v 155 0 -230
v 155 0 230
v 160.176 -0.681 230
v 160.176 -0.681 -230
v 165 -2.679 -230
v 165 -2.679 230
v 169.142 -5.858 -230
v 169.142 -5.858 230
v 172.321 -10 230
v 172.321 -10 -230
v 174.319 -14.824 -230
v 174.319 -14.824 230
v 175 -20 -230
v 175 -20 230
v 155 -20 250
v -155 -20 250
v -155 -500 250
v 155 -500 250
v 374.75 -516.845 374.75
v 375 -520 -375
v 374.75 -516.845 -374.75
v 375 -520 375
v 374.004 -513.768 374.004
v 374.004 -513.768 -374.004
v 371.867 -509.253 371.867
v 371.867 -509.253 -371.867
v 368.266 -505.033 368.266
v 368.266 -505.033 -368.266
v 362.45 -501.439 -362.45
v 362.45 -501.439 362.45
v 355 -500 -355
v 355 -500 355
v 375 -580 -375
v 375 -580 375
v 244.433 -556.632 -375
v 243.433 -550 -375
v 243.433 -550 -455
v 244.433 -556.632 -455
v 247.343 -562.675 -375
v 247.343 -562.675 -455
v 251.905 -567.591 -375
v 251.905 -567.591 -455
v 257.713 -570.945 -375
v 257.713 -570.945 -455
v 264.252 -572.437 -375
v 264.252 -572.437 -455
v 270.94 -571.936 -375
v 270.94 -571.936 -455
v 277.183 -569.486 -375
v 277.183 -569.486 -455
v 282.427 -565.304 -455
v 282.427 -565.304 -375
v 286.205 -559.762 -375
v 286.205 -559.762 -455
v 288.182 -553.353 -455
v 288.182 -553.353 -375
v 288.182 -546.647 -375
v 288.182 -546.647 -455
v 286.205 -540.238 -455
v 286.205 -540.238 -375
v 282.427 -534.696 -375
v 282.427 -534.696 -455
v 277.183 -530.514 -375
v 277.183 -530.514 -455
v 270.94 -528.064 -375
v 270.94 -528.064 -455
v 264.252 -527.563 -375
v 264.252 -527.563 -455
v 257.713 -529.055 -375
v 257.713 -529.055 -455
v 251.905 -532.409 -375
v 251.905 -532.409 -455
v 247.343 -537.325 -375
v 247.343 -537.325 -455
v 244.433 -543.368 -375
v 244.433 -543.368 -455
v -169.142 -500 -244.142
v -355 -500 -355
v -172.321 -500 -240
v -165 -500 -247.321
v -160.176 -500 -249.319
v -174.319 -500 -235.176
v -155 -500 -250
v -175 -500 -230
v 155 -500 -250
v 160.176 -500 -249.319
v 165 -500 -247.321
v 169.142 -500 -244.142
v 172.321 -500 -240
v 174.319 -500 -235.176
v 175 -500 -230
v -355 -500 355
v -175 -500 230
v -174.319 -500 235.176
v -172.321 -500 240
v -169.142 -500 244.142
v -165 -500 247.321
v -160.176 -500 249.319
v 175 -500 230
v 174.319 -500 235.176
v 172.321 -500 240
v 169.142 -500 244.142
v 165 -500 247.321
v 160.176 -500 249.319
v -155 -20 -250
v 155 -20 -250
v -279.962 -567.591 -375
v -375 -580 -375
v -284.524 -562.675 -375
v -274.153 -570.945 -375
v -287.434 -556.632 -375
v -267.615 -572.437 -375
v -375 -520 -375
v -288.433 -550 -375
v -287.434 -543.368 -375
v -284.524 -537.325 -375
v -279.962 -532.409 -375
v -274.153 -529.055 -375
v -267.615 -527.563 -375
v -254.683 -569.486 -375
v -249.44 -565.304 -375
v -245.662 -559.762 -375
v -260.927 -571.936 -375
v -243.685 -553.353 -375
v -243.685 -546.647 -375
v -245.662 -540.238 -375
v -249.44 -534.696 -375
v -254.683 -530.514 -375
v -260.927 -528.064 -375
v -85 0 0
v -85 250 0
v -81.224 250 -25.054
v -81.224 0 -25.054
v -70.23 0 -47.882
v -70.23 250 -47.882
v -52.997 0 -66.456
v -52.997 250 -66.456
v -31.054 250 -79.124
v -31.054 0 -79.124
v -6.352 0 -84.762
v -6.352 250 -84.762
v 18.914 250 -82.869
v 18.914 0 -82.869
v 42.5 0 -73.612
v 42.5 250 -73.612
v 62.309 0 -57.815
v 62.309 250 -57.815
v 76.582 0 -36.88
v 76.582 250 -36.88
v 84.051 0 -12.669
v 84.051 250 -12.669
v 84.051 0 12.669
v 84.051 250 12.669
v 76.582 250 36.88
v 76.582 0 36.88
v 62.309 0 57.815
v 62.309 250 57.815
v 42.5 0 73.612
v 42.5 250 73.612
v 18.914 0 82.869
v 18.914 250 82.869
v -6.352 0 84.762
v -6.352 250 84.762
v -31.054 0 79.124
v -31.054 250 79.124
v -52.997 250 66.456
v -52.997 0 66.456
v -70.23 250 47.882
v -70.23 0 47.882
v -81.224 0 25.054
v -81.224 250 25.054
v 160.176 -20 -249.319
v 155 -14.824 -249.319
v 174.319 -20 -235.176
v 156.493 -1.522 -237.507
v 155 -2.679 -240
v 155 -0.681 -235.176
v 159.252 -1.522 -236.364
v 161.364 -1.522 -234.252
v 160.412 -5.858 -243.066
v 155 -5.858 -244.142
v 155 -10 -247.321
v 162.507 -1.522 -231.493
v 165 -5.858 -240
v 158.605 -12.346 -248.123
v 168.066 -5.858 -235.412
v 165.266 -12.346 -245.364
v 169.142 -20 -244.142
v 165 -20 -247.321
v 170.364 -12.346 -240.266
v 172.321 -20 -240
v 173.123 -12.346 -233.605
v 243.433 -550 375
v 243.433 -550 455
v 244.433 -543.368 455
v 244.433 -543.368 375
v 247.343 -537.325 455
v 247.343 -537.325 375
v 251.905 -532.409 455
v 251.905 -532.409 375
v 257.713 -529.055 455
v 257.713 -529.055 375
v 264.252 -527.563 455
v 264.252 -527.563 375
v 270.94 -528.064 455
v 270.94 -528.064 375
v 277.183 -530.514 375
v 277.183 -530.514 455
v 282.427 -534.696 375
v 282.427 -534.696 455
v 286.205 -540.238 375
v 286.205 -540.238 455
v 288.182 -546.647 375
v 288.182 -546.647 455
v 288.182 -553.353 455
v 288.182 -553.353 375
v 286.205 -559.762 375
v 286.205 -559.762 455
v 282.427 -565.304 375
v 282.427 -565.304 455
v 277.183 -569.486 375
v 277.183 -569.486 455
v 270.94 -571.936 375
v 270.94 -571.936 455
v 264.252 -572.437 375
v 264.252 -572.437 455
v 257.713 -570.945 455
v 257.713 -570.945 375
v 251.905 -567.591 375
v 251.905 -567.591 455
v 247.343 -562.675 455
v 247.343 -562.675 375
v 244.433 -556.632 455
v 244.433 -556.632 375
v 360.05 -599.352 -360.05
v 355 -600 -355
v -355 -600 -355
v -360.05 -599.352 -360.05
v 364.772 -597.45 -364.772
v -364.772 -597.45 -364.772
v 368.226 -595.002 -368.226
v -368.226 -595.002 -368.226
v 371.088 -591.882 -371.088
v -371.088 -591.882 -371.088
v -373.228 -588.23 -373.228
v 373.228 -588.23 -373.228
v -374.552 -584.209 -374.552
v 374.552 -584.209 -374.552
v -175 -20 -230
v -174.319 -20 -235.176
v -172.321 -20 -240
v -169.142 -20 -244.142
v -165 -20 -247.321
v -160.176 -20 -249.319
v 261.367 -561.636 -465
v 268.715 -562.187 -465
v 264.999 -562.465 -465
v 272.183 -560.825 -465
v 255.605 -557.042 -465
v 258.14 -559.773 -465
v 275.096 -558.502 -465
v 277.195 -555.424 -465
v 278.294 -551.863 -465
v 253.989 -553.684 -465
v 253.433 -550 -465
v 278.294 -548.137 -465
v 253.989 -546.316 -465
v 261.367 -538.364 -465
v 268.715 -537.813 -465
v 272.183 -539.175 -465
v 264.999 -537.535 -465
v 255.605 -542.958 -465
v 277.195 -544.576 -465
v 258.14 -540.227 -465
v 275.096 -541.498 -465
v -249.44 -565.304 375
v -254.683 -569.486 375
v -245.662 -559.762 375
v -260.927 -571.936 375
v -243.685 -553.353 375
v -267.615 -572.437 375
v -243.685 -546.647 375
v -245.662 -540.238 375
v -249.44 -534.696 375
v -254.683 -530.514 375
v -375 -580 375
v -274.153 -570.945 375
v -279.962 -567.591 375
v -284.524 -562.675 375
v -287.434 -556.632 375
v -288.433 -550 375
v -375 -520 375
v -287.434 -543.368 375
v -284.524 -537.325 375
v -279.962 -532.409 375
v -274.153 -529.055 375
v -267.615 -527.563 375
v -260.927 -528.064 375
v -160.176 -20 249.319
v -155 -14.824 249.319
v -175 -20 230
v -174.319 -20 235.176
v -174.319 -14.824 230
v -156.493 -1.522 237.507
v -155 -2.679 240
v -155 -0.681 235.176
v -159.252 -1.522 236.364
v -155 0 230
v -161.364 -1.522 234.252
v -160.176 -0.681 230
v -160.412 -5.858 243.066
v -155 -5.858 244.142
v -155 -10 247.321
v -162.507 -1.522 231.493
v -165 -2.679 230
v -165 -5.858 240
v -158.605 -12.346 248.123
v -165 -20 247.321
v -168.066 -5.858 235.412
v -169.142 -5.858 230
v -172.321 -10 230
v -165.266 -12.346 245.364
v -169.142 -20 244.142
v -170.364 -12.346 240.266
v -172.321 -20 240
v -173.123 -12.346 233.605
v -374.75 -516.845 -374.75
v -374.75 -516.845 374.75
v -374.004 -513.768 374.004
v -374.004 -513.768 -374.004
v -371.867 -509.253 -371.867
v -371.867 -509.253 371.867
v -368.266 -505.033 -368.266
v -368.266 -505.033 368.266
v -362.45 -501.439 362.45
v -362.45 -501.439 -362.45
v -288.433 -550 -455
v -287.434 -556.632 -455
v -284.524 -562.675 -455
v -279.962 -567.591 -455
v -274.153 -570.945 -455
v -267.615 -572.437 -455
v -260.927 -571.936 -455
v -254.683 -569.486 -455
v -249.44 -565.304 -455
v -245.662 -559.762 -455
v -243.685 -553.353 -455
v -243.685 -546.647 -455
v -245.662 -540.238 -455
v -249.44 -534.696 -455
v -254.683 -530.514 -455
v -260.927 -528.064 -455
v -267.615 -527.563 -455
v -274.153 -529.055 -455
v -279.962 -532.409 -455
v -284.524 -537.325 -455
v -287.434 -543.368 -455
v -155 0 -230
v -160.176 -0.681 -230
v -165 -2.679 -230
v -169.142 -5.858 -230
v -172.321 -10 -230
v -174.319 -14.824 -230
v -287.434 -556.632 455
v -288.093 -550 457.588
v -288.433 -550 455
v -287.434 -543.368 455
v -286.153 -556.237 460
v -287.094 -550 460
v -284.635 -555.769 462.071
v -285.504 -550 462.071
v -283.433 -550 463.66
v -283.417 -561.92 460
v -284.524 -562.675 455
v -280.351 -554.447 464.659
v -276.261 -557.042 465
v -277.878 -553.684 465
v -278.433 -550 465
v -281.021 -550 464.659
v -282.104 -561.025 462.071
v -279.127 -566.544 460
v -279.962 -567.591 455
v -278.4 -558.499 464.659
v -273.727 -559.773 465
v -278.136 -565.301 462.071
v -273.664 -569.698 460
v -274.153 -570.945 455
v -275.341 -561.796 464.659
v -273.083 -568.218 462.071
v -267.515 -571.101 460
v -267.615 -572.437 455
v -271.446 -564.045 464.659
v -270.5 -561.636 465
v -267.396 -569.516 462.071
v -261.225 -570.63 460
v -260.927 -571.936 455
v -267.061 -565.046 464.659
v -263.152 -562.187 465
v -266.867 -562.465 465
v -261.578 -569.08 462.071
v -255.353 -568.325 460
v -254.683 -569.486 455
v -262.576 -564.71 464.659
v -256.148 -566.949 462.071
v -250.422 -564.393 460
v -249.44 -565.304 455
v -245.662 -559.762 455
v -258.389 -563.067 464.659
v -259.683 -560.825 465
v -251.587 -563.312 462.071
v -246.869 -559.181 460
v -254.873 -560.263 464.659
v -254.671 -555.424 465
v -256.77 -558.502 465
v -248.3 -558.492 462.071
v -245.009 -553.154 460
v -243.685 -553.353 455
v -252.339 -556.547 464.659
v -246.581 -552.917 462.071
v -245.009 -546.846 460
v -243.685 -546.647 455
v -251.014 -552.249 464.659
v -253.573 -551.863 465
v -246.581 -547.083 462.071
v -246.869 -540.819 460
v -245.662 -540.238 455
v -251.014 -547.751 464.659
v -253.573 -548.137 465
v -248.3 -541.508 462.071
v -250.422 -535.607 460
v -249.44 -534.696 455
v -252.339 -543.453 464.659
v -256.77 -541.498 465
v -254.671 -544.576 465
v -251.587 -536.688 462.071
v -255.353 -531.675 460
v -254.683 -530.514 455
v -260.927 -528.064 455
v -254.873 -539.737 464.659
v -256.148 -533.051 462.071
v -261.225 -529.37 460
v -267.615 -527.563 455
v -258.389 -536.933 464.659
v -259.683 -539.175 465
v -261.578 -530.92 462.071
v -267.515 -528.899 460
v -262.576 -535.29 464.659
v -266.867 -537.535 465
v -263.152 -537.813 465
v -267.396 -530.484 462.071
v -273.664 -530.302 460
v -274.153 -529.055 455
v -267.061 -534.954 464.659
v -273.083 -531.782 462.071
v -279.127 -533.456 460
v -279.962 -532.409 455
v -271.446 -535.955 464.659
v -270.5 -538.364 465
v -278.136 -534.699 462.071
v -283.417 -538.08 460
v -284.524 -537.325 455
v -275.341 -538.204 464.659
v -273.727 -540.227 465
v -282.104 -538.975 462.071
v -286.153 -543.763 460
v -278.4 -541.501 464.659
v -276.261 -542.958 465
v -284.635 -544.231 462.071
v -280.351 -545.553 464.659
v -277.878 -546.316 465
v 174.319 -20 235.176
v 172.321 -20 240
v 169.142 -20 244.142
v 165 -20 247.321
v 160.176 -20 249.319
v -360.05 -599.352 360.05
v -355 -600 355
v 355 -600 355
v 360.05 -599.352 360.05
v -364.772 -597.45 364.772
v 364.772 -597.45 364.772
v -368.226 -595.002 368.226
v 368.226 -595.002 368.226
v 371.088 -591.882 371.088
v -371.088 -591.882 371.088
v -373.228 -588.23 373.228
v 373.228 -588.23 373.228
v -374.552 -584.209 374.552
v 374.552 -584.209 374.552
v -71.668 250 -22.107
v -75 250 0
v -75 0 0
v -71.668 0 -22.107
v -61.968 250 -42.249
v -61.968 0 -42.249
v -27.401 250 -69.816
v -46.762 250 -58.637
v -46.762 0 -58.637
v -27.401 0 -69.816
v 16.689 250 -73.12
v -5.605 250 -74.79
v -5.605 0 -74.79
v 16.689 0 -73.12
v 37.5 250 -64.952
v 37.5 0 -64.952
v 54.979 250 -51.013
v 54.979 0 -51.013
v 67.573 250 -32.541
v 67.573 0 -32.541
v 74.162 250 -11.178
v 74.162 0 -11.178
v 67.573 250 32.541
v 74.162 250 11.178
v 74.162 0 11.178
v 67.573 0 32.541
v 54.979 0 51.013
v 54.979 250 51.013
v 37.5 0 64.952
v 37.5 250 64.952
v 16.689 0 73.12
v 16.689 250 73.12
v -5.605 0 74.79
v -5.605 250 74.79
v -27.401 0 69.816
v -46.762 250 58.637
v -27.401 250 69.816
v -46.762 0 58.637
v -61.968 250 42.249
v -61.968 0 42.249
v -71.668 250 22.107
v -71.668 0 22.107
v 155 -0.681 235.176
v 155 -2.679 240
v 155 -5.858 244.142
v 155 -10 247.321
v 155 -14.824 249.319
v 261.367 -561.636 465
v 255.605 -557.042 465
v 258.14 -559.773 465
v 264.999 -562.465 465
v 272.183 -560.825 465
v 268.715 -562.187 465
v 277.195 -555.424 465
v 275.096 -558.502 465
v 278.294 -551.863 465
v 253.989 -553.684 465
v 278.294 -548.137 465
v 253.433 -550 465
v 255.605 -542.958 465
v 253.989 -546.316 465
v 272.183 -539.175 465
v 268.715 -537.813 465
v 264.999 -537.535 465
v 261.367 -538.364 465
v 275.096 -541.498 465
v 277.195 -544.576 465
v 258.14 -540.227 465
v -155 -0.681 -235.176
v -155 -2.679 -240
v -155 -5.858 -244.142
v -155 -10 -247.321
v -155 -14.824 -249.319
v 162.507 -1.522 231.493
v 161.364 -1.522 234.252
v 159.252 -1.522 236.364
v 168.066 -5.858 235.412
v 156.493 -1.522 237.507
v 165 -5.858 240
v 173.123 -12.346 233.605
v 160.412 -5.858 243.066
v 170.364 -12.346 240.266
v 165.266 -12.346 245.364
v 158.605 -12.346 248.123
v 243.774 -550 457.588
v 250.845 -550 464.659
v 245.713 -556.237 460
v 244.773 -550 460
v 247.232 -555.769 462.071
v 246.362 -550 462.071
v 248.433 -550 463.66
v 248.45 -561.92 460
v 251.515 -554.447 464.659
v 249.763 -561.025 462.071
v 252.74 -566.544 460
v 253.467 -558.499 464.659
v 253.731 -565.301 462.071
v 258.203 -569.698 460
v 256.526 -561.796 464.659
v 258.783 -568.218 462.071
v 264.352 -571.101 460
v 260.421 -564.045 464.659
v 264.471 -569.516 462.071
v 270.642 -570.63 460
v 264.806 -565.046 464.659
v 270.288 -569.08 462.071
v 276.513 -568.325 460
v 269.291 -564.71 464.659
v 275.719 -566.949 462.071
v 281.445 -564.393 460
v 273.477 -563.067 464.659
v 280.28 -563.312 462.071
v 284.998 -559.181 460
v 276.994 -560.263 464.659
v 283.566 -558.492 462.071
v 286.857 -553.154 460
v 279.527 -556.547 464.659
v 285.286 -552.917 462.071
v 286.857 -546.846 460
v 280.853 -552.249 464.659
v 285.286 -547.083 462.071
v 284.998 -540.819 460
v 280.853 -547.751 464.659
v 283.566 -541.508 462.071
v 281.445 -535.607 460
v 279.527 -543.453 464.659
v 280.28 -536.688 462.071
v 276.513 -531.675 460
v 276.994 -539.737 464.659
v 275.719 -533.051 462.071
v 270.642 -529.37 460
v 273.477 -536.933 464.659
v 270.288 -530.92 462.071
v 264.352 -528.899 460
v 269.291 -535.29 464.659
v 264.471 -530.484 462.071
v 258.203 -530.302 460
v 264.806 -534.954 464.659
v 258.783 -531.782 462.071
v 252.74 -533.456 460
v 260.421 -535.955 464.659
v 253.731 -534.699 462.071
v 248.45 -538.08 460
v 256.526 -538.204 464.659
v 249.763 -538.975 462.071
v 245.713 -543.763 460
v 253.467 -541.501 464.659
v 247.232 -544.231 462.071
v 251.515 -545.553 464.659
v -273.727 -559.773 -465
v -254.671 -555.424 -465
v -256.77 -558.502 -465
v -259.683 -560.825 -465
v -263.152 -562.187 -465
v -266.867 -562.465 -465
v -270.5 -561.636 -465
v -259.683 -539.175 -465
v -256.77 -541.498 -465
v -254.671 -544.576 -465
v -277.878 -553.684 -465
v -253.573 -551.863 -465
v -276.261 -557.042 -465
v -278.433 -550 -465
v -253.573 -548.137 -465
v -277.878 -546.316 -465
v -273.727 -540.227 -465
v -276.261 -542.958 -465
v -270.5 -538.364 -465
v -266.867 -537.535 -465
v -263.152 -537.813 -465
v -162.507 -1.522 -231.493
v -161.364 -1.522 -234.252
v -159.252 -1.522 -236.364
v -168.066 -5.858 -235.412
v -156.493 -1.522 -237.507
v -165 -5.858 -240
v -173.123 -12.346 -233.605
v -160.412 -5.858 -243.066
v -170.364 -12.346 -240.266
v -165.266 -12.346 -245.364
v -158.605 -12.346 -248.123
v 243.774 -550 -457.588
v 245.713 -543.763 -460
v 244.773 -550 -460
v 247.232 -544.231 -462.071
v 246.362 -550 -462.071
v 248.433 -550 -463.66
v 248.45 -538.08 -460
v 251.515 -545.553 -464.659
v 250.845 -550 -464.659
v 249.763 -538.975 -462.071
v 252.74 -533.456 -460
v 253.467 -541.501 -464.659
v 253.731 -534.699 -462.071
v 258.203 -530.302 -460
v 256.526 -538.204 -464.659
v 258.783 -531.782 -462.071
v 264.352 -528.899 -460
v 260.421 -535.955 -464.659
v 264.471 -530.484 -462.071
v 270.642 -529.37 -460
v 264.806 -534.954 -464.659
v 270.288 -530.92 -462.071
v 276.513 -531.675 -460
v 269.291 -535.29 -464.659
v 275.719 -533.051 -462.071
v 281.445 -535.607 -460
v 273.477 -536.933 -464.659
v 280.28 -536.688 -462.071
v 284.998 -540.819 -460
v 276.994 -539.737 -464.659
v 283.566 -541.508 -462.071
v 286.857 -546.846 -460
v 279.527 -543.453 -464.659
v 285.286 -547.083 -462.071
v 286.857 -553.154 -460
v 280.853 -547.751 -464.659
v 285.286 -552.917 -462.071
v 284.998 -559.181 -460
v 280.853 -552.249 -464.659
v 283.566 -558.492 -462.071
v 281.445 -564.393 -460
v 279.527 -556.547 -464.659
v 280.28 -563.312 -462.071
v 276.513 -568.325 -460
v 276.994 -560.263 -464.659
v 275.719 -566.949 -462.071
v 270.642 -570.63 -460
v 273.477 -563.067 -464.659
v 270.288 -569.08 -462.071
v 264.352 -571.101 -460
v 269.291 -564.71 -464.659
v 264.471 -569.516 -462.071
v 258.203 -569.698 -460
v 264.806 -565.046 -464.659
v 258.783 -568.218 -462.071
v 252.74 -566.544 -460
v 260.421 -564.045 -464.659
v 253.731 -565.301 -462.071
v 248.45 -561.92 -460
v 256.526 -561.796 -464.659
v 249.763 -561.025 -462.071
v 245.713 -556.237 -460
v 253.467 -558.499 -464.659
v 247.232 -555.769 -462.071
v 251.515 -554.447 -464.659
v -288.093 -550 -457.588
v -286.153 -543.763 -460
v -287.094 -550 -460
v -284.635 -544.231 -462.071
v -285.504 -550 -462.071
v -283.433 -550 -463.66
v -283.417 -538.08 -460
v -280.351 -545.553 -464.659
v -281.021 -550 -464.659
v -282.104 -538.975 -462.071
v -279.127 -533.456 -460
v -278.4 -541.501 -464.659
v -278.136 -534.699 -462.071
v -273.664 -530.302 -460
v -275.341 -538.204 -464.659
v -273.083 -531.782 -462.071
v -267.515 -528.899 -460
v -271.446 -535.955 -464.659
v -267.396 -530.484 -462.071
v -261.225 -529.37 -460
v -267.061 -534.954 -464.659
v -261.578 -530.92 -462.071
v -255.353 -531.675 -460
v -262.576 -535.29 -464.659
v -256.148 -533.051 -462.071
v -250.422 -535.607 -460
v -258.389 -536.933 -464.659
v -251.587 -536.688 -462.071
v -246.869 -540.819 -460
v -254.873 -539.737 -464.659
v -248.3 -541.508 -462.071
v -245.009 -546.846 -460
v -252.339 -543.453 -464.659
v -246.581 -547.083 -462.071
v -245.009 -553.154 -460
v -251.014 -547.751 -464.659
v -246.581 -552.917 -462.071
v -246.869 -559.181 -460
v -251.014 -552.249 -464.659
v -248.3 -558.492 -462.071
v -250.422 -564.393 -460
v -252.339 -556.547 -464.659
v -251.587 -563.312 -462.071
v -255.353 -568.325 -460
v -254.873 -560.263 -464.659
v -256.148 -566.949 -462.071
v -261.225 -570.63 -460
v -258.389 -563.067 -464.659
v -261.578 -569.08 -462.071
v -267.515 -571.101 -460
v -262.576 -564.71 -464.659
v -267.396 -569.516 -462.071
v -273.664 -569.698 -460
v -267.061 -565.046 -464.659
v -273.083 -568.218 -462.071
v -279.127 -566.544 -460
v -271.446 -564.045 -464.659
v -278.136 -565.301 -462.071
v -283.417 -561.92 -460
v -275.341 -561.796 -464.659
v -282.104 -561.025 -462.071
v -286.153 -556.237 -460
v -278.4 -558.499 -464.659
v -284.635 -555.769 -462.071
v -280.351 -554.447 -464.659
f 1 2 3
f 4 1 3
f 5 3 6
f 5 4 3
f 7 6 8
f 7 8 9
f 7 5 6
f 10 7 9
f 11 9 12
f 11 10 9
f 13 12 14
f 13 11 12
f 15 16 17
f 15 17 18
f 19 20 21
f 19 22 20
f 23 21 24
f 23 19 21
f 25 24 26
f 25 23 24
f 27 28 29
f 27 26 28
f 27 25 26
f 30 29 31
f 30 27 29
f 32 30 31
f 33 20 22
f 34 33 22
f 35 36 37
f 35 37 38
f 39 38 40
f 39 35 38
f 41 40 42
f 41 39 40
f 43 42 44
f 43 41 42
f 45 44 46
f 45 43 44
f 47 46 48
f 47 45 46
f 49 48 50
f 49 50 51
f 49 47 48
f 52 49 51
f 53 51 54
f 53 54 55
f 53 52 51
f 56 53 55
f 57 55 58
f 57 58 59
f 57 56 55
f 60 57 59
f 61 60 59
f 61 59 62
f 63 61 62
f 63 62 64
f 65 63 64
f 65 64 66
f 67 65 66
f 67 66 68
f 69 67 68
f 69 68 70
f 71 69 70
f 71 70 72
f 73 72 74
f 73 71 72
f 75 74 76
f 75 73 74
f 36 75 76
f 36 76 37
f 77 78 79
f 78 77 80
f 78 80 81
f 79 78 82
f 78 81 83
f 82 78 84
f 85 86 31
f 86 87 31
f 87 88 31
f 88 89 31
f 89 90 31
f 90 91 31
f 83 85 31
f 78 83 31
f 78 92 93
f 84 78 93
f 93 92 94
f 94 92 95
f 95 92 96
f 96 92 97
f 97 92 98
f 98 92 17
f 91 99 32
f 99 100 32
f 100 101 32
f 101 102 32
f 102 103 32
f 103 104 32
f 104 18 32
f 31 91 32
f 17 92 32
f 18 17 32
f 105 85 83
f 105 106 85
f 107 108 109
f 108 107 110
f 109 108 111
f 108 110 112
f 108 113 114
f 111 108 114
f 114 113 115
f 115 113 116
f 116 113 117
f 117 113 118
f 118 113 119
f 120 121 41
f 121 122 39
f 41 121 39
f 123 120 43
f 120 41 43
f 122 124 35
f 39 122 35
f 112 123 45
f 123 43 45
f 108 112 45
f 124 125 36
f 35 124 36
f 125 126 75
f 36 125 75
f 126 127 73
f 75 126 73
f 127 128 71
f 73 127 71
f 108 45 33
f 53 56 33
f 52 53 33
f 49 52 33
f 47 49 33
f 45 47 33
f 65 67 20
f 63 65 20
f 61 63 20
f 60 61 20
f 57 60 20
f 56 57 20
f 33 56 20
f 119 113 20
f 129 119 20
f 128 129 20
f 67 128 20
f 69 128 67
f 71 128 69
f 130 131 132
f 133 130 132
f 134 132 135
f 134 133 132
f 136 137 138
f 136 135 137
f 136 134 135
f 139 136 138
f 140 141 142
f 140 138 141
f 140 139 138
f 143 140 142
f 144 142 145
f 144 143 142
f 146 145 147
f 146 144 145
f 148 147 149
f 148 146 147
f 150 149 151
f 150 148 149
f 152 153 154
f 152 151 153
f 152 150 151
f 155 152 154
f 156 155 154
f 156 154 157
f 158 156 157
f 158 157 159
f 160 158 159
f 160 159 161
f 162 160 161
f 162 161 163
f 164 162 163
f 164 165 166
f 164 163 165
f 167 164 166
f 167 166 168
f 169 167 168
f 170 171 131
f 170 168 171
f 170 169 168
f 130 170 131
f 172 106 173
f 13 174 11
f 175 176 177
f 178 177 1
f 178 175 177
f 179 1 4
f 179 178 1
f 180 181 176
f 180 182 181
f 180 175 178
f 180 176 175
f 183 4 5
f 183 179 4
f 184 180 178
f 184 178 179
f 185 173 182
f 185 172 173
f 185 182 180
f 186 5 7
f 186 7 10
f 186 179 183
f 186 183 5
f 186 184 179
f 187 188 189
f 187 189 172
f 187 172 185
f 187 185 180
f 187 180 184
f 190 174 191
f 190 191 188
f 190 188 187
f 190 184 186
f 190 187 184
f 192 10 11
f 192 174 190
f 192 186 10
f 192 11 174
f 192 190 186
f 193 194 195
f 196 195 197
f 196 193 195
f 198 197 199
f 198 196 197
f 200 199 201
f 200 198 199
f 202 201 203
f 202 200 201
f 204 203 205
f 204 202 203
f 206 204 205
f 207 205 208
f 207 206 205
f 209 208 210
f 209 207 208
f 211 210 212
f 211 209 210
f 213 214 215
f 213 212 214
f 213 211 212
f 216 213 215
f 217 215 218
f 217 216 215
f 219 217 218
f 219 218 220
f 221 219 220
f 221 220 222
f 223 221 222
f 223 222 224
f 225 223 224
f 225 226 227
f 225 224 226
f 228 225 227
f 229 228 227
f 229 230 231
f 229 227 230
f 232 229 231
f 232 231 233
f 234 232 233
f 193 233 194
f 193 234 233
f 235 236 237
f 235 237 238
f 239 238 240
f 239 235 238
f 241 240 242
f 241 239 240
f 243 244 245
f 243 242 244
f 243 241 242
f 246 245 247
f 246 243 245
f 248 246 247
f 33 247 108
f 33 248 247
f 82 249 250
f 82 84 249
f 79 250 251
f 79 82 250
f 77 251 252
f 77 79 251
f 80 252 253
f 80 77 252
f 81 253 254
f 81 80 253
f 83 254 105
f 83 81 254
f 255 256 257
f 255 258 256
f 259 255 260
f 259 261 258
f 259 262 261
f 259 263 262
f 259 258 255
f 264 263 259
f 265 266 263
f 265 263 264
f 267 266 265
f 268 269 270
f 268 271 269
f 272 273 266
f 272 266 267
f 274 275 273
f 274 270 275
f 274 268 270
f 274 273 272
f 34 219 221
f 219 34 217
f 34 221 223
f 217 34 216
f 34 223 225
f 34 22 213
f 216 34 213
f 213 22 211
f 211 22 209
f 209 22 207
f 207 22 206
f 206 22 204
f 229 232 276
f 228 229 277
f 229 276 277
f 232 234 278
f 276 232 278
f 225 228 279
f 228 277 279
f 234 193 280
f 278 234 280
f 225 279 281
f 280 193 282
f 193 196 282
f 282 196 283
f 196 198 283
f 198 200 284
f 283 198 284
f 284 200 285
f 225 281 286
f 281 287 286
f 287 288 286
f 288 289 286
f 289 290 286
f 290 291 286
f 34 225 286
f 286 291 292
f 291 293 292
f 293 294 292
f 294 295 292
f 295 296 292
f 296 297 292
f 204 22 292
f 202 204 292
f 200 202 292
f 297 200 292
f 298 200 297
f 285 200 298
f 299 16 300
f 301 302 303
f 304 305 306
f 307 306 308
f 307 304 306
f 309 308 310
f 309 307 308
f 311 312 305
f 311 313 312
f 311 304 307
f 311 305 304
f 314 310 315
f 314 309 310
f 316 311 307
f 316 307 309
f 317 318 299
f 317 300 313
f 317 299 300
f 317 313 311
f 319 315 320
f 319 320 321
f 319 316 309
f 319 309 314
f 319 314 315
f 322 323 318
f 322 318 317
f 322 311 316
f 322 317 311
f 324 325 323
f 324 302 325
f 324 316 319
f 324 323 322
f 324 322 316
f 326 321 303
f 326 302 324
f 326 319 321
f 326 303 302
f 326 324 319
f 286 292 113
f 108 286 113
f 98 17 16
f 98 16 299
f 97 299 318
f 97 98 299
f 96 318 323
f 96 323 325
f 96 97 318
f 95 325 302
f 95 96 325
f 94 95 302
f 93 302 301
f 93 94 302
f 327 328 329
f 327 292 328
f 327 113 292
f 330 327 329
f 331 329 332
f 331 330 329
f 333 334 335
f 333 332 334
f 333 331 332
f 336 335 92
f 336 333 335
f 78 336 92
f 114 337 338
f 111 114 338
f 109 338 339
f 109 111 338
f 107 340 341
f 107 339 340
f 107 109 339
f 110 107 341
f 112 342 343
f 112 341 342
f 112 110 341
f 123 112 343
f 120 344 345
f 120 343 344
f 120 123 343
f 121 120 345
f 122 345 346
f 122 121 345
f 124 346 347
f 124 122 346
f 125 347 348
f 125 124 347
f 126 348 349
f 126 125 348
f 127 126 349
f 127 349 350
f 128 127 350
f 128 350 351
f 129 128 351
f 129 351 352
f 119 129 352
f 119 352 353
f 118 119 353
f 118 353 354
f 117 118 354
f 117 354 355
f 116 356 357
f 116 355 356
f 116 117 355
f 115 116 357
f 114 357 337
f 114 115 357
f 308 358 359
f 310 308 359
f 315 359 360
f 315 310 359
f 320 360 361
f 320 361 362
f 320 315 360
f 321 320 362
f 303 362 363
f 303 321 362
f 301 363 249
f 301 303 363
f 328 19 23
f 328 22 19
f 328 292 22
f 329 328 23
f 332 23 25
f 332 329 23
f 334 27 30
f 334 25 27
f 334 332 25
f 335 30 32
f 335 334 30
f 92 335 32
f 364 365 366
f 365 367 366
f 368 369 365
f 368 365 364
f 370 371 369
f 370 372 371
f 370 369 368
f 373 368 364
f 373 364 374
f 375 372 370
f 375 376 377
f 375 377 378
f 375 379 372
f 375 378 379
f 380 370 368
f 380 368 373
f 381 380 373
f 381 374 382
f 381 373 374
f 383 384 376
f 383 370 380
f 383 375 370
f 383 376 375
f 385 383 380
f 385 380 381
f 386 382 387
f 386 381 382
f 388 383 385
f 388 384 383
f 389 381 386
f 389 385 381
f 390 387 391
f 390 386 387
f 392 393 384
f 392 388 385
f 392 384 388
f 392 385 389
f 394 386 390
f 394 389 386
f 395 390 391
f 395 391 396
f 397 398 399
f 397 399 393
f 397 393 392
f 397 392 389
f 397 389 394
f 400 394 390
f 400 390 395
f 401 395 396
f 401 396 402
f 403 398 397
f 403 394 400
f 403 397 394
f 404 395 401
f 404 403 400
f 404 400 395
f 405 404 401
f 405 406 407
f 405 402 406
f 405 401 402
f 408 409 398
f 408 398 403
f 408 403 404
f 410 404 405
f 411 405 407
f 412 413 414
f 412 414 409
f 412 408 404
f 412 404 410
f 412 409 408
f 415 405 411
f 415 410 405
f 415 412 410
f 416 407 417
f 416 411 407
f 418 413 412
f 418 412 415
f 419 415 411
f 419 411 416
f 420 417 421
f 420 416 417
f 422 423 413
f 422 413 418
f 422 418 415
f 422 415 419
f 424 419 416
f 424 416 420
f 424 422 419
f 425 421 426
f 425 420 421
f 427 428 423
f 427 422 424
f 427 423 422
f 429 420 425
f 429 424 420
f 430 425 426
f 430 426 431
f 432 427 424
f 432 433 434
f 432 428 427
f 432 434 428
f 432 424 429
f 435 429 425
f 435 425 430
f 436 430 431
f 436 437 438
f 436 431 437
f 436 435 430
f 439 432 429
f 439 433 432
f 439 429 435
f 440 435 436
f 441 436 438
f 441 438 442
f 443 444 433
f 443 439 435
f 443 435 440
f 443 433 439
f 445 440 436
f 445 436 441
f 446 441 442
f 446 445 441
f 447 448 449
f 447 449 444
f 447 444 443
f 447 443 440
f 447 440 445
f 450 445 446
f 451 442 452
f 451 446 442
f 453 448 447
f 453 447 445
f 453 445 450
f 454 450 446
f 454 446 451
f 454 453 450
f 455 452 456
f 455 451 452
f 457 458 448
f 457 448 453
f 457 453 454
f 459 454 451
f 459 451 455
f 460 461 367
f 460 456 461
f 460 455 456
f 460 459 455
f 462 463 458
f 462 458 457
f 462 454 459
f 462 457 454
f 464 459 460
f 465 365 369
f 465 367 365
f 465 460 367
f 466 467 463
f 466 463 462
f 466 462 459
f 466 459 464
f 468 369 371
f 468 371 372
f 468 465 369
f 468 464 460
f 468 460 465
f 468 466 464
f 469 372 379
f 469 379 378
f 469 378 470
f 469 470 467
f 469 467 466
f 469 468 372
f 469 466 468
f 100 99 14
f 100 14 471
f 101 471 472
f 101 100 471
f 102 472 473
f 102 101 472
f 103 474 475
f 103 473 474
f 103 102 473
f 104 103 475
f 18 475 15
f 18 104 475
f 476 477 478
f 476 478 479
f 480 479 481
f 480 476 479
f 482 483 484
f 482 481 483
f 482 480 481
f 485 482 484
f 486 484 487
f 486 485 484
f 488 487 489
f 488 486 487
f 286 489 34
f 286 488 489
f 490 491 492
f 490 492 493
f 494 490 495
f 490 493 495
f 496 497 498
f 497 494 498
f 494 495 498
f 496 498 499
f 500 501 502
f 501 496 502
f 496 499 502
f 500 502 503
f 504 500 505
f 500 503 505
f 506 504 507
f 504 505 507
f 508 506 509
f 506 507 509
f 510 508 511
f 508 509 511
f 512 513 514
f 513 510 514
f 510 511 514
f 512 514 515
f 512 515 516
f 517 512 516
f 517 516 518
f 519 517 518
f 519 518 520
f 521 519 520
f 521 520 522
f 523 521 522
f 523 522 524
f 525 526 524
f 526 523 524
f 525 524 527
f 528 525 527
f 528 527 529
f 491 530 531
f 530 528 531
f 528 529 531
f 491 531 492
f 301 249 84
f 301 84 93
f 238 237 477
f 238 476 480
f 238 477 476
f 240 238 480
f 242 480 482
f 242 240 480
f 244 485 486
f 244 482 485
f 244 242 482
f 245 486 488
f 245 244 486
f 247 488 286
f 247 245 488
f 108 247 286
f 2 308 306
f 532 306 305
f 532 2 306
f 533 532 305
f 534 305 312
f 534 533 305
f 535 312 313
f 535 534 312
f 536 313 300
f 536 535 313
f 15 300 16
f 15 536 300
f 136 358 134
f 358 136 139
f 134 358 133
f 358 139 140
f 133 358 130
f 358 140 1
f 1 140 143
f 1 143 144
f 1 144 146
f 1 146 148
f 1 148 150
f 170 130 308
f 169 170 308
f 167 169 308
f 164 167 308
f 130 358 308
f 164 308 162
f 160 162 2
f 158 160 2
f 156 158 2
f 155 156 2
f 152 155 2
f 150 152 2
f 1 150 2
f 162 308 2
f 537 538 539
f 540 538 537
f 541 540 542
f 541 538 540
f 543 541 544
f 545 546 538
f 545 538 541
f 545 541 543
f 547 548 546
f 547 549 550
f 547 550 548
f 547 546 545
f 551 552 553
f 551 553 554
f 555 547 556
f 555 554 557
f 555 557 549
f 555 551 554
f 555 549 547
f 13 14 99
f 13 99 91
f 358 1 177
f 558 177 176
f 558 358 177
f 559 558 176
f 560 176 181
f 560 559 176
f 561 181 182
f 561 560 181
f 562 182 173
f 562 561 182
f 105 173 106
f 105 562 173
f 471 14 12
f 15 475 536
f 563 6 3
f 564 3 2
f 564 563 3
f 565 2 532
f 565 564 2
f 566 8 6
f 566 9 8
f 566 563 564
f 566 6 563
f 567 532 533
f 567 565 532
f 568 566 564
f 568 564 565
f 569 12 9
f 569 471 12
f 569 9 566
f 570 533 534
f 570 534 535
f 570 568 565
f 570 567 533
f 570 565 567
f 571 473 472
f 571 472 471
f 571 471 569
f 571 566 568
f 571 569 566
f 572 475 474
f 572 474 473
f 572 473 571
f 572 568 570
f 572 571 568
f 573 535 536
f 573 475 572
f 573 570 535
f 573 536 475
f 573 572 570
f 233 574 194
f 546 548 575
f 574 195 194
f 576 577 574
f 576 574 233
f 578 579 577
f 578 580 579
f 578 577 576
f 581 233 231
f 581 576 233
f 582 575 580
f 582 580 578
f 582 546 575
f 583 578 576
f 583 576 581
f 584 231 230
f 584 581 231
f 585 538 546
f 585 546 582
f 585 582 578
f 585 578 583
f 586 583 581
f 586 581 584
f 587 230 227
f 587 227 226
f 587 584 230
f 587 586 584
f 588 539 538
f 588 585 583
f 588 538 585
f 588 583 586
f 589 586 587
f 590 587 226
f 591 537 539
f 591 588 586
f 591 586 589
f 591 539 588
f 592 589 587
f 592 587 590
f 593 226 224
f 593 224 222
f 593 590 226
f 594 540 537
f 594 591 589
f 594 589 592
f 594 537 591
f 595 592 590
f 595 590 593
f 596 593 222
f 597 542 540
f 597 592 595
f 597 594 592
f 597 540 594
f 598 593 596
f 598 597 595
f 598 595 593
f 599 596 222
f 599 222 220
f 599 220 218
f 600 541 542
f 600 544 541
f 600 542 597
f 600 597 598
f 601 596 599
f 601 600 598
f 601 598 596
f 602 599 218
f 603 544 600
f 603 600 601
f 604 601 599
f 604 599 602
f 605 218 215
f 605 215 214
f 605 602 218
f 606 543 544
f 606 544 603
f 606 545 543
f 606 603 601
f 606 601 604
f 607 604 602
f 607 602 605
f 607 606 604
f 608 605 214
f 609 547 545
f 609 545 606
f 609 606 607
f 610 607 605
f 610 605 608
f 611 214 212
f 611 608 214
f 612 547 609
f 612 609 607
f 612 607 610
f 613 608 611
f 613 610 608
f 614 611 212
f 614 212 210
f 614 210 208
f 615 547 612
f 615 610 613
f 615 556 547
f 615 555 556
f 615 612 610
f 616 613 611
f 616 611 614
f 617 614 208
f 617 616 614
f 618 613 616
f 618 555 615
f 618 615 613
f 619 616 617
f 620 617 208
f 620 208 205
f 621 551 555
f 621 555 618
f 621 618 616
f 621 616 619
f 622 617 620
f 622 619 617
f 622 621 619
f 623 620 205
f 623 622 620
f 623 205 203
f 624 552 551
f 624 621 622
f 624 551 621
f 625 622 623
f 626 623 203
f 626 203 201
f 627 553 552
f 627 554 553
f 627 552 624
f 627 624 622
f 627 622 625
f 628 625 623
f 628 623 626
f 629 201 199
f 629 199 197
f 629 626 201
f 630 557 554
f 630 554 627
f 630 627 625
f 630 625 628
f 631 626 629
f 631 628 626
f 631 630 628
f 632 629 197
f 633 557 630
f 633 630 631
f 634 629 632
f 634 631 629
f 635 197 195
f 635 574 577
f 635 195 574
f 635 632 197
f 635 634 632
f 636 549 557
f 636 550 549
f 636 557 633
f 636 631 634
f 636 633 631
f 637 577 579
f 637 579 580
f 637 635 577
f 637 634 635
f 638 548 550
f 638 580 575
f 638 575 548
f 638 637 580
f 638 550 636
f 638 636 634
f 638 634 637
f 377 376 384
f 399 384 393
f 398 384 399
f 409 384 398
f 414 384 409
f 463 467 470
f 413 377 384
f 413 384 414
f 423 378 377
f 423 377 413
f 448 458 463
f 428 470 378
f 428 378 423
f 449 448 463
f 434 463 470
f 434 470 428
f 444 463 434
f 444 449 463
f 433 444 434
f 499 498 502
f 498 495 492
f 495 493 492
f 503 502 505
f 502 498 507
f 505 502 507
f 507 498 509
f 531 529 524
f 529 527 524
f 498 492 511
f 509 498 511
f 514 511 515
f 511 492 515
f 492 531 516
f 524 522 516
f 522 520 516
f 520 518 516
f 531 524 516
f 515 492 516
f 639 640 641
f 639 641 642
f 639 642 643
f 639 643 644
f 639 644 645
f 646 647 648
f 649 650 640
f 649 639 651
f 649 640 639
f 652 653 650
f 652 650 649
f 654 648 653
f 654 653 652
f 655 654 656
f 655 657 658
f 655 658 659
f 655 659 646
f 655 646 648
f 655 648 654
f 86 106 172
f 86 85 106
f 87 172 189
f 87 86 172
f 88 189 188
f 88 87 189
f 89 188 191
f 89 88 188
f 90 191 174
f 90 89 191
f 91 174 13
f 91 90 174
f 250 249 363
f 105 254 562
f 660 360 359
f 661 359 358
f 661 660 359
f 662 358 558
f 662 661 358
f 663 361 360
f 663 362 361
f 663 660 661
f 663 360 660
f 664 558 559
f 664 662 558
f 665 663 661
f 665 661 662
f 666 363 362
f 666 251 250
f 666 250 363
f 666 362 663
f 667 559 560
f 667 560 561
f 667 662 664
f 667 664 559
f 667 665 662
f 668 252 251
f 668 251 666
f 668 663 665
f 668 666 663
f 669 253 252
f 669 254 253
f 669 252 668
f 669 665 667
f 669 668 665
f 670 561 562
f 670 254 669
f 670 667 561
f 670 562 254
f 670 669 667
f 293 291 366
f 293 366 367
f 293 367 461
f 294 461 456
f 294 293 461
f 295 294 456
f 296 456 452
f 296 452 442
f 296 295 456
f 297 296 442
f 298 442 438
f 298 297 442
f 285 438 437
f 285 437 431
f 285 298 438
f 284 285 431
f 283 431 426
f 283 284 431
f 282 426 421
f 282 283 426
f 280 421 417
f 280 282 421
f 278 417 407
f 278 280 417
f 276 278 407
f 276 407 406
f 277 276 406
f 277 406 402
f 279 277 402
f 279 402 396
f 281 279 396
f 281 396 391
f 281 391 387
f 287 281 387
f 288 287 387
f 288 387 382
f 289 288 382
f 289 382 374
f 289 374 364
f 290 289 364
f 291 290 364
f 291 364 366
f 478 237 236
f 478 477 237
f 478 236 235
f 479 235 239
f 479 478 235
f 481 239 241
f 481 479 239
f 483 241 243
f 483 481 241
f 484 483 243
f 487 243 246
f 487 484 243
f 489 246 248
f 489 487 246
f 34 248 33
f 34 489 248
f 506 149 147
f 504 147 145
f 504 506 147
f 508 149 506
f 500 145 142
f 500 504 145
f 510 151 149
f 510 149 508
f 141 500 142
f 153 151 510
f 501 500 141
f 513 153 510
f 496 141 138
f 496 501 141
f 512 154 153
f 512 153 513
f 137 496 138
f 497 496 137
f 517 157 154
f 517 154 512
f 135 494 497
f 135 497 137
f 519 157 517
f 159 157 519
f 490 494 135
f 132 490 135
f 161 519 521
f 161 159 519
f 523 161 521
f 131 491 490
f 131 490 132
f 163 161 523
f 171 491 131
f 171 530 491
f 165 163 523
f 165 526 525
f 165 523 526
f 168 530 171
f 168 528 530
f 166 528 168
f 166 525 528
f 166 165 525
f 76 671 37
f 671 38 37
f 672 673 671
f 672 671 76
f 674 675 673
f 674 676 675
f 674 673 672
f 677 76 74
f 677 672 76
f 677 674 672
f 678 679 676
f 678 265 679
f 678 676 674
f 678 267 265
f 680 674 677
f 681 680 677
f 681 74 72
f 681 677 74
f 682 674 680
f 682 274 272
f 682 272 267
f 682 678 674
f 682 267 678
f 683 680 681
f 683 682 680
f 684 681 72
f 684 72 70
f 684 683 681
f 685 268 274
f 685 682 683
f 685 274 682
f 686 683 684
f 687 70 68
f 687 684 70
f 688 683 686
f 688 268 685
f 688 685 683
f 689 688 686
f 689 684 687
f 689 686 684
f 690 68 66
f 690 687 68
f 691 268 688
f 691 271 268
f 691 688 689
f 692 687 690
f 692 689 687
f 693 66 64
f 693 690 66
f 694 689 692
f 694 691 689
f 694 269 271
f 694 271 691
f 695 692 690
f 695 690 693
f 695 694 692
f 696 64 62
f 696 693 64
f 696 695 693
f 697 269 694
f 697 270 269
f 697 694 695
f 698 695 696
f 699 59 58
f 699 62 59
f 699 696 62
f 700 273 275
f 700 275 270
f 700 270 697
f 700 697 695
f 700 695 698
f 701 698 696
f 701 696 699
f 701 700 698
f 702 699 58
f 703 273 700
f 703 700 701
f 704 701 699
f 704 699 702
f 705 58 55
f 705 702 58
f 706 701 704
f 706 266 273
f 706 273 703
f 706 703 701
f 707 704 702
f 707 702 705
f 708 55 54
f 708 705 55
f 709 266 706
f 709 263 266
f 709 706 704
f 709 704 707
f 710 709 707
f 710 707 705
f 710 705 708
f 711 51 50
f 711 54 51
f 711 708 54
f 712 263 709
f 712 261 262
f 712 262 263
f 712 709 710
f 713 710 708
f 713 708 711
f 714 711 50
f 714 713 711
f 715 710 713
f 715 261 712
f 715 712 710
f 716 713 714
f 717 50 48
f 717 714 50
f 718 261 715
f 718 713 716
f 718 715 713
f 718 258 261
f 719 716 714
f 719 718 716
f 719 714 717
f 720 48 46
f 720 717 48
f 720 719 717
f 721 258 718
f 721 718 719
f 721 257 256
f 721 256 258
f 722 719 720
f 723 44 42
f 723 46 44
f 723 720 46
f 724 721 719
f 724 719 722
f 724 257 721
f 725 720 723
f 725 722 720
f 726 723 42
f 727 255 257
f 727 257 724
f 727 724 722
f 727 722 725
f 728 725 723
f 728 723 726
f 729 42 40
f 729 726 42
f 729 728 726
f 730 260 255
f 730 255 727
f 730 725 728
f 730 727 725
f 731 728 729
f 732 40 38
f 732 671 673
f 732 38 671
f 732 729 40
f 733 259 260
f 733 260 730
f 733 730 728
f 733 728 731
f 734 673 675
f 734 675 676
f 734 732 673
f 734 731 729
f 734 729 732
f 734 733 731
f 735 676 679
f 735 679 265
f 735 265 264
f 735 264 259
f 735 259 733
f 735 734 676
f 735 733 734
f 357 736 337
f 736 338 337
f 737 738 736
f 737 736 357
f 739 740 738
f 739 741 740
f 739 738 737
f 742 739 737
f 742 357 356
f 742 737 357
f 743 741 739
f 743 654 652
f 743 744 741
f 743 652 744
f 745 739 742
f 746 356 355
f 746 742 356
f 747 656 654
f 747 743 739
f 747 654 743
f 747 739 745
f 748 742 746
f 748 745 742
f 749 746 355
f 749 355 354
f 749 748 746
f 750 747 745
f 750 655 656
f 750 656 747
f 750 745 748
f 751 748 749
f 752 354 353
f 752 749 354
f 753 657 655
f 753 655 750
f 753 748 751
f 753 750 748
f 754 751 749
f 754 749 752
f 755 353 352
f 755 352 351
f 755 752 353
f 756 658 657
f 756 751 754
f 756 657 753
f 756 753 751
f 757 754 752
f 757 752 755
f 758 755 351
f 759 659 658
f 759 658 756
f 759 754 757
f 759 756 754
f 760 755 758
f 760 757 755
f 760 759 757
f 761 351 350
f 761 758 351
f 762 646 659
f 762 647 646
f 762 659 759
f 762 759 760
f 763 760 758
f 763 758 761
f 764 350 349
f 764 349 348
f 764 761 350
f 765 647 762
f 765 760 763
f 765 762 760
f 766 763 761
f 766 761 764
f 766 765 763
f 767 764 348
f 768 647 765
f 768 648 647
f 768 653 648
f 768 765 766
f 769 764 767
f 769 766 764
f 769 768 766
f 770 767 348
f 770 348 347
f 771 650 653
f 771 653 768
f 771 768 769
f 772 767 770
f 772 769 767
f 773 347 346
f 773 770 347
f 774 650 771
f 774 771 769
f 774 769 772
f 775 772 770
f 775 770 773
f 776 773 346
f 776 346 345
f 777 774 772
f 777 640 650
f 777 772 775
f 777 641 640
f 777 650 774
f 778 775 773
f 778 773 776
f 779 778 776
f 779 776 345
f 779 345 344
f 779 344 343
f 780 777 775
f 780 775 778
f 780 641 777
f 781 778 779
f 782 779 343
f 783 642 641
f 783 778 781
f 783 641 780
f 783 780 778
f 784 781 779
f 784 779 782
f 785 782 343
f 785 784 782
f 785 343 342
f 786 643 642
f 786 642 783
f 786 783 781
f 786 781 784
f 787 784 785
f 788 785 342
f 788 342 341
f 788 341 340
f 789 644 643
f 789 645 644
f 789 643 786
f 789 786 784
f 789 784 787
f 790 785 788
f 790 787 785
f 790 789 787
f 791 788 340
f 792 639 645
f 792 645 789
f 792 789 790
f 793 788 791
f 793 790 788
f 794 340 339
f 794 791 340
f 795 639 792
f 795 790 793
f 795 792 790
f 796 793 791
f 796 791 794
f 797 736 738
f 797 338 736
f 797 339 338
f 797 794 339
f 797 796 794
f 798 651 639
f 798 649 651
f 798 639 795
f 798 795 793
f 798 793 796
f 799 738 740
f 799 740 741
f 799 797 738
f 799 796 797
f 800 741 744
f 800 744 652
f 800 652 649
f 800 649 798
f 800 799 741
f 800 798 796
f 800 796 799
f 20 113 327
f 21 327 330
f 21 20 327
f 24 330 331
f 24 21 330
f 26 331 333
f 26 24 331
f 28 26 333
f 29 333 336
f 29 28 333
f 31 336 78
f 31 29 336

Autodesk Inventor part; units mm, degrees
ref_plane "YZ Plane" through (0, 0, 0) normal (1, 0, 0) x (0, 1, 0)
ref_plane "XZ Plane" through (0, 0, 0) normal (0, 1, 0) x (-1, 0, 0)
ref_plane "XY Plane" through (0, 0, 0) normal (0, 0, 1) x (1, 0, 0)
sketch "Sketch1" plane through (0, 0, 0) normal (0, 1, 0) x (-1, 0, 0)
  circle A0 centre (0, 0) radius 75
  circle A1 centre (0, 0) radius 85
  dimension "d1" = 150
  dimension "d2" = 170
extrude "Extrusion1" add sketch "Sketch1" along normal blind 250
sketch "Sketch2" plane through (0, 0, 0) normal (0, -1, 0) x (1, 0, 0)
  line L0 (-175, 250) -> (175, 250)
  line L1 (175, 250) -> (175, -250)
  line L2 (175, -250) -> (-175, -250)
  line L3 (-175, -250) -> (-175, 250)
  line L4 (-175, 250) -> (175, -250) construction
  line L5 (175, 250) -> (-175, -250) construction
  point P0 (0, 0)
  dimension "d5" = 500
  dimension "d6" = 350
extrude "Extrusion2" add sketch "Sketch2" along normal blind 500
sketch "Sketch3" plane through (0, -500, 0) normal (0, -1, 0) x (1, 0, 0)
  line L0 (-375, -375) -> (375, -375)
  line L1 (375, -375) -> (375, 375)
  line L2 (375, 375) -> (-375, 375)
  line L3 (-375, 375) -> (-375, -375)
  line L4 (-375, -375) -> (375, 375) construction
  line L5 (375, -375) -> (-375, 375) construction
  point P0 (0, 0)
  dimension "d9" = 750
  dimension "d10" = 750
extrude "Extrusion3" add sketch "Sketch3" along normal blind 100
fillet "Fillet2" radius 20 8 edges at (-175, -250, -250) (175, -250, -250) (-175, -250, 250) (175, -250, 250) (0, 0, 250) (175, 0, 0) (-175, 0, 0) (0, 0, -250)
fillet "Fillet3" radius 20 8 edges at (0, -600, -375) (0, -500, -375) (-375, -500, 0) (-375, -600, 0) (0, -600, 375) (0, -500, 375) (375, -500, 0) (375, -600, 0)
sketch "Sketch7" plane through (375, -520, -375) normal (0, 0, -1) x (-1, 0, 0)
  line L0 (750, 0) -> (0, 0) projected
  arc A0 (0, -60) -> (20, -80) centre (20, -60) ccw projected
  line L1 (0, 0) -> (0, -60)
  line L2 (109.0667, 0) -> (109.0667, -60)
  line L3 (1, -60) -> (749, -60) projected
  circle A1 centre (109.0667, -30) radius 22.5
  line L4 (375, 0) -> (375, -60)
  circle A2 centre (640.9333, -30) radius 22.5
  point P0 (375, 520)
  dimension "d27" = 45
extrude "Extrusion7" add sketch "Sketch7" along normal blind 90 contours A1 L2 | L2 A1 | A2
mirror "Mirror4" about plane through (0, 0, 0) normal (0, 0, 1) of "Extrusion7"
fillet "Fillet4" radius 10 4 edges at (-243.4333, -550, 465) (288.4333, -550, 465) (288.4333, -550, -465) (-243.4333, -550, -465)
properties part number "Base Prime" material "Aluminum 6061"
